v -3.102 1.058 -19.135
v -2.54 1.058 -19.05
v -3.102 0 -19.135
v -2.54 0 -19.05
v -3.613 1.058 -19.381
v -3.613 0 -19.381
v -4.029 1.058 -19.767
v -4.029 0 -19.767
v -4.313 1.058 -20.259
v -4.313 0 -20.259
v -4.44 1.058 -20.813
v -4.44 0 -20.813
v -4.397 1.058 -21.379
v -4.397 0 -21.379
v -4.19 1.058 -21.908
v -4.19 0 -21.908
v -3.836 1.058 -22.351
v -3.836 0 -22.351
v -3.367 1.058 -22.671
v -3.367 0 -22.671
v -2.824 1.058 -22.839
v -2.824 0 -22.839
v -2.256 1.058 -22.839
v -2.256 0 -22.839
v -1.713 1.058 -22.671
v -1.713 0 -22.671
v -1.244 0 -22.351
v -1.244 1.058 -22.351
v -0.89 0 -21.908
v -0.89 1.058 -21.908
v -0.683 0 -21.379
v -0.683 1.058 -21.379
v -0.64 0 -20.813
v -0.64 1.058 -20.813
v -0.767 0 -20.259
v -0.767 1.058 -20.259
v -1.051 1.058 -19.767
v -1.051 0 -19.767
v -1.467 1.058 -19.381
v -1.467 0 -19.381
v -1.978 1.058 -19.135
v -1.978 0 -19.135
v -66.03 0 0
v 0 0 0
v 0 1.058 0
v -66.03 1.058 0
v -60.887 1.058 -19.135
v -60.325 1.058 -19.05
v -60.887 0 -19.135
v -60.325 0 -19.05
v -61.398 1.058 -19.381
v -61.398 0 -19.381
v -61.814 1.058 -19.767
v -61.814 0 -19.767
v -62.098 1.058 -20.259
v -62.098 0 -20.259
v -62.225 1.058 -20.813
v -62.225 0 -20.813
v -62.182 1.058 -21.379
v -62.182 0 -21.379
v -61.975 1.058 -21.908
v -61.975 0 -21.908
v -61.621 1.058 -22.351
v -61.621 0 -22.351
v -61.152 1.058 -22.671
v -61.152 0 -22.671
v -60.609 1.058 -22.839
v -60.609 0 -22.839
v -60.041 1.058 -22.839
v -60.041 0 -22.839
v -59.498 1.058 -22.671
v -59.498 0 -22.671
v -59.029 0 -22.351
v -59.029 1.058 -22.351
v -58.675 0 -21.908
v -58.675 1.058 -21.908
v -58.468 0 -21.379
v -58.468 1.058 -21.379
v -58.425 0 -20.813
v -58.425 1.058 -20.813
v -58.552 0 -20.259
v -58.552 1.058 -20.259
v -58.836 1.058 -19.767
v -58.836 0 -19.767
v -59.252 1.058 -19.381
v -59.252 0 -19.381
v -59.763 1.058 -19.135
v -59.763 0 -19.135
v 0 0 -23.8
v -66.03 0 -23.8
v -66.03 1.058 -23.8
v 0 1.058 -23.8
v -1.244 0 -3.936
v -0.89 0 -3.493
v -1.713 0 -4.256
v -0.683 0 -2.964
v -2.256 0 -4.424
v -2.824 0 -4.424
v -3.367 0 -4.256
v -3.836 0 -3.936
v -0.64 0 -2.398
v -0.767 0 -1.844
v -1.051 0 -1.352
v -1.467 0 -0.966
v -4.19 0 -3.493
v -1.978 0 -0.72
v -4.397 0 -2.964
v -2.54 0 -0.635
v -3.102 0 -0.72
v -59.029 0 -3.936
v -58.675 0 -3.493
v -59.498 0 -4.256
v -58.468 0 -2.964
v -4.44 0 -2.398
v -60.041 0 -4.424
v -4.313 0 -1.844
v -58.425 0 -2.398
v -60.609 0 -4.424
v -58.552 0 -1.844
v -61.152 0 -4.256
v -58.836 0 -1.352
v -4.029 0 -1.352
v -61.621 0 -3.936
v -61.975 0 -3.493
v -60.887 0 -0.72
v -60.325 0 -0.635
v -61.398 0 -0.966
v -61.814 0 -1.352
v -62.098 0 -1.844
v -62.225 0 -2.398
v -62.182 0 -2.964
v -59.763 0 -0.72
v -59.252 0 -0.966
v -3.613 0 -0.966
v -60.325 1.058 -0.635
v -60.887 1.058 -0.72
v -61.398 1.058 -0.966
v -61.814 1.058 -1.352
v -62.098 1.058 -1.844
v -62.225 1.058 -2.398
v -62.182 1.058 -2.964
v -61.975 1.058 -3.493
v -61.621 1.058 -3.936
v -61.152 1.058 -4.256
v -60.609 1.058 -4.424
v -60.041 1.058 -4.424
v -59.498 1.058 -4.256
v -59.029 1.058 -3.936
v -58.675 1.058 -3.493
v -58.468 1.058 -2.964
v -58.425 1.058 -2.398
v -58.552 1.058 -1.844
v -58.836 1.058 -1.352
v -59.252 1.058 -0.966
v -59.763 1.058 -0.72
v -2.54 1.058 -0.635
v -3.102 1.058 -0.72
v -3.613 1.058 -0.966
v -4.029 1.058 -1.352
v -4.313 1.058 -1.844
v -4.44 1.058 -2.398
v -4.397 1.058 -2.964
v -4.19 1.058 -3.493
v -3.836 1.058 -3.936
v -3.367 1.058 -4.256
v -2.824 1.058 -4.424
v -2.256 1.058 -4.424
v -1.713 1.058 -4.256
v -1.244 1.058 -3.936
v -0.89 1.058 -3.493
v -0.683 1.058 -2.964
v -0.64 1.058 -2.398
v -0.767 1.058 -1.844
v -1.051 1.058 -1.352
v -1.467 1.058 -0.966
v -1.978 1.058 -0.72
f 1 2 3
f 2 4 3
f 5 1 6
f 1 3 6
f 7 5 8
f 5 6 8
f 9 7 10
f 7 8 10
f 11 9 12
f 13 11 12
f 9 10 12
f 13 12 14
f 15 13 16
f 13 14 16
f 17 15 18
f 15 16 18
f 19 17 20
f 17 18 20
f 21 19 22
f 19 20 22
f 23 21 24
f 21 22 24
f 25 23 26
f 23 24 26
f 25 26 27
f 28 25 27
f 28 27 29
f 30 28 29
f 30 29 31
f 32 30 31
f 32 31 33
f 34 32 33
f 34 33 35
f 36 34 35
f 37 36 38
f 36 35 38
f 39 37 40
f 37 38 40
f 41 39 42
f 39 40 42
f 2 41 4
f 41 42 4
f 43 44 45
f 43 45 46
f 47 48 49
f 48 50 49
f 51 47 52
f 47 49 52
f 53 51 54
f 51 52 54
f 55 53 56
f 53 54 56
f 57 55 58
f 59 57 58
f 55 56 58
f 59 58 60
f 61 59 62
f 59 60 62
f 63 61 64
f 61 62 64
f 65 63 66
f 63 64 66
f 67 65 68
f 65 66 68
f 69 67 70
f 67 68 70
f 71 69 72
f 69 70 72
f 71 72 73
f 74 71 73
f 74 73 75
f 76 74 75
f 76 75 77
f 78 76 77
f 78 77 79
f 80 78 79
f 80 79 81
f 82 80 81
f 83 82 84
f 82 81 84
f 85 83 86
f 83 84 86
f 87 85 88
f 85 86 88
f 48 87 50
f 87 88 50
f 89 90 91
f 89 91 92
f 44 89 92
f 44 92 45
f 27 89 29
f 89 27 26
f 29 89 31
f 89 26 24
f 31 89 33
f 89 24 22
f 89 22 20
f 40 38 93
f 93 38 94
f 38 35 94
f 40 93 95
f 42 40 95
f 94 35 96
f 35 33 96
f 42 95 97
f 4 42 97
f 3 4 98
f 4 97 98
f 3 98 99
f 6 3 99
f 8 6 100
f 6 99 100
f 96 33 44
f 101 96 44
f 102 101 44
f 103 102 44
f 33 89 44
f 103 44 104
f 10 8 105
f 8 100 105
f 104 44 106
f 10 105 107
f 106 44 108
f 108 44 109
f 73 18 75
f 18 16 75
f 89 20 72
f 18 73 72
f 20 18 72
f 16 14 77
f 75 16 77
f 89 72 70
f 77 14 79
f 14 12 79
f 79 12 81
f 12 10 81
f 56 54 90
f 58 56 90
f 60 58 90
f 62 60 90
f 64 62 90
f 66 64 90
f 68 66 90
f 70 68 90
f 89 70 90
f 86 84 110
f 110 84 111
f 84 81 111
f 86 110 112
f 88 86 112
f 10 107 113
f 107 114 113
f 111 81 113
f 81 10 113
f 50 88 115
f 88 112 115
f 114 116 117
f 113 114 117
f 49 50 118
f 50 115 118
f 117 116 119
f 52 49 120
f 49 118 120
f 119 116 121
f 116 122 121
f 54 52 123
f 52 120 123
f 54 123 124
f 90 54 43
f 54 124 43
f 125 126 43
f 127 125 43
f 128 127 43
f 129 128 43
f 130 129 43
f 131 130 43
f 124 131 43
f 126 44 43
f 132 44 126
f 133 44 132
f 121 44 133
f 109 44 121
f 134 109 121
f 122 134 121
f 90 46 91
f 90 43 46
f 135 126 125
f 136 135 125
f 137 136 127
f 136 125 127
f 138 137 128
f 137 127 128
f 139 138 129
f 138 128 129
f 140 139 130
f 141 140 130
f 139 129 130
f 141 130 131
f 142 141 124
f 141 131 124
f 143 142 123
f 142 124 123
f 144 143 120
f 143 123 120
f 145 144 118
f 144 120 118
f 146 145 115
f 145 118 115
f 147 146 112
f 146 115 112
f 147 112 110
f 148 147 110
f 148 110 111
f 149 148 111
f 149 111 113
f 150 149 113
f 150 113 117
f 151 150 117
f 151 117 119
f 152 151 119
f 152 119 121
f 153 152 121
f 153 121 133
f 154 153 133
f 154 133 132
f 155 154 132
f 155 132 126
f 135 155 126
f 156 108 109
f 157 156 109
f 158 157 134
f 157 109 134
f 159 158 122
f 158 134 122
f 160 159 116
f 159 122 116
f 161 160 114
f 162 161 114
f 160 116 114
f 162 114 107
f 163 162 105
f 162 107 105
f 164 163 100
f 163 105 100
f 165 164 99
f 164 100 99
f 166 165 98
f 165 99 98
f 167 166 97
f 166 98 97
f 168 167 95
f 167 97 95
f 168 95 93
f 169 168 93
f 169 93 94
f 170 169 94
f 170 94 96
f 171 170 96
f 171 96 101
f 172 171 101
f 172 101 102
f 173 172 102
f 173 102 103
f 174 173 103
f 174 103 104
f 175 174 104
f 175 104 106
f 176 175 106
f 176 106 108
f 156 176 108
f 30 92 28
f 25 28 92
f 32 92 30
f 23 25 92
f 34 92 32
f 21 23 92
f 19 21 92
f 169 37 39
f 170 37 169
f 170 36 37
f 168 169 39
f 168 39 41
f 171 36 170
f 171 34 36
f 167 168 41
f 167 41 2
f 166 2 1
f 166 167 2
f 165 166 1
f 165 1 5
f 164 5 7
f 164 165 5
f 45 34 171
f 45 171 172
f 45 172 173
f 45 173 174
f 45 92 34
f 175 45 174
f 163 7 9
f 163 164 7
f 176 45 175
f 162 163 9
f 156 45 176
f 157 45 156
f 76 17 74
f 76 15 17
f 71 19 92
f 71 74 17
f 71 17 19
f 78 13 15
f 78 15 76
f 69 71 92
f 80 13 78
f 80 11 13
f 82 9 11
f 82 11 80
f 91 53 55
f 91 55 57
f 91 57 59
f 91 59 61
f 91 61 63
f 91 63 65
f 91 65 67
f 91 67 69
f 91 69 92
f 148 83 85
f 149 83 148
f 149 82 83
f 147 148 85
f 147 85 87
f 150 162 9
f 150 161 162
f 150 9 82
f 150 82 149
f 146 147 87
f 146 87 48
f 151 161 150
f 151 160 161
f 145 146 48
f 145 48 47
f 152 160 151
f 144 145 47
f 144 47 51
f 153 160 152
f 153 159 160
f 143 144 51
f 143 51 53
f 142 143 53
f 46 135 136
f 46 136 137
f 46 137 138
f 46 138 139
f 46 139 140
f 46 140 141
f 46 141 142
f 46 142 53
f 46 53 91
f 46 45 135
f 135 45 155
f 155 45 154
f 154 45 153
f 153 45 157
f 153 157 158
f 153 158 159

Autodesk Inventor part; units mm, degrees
ref_plane "YZ Plane" through (0, 0, 0) normal (1, 0, 0) x (0, 1, 0)
ref_plane "XZ Plane" through (0, 0, 0) normal (0, 1, 0) x (-1, 0, 0)
ref_plane "XY Plane" through (0, 0, 0) normal (0, 0, 1) x (1, 0, 0)
sketch "Sketch1" plane through (0, 0, 0) normal (0, 1, 0) x (-1, 0, 0)
  line L0 (0, 0) -> (66.03, 0)
  line L1 (66.03, 0) -> (66.03, -23.8)
  line L2 (66.03, -23.8) -> (0, -23.8)
  line L3 (0, -23.8) -> (0, 0)
  dimension "d0" = 66.03
  dimension "d1" = 23.8
extrude "Extrusion1" add sketch "Sketch1" along normal blind 1.0583
sketch "Sketch2" plane through (0, 1.0583, 0) normal (0, 1, 0) x (1, 0, 0)
  line L0 (0, 0) -> (0, 23.8) projected
  line L1 (-66.03, 0) -> (0, 0) projected
  point P0 (-60.325, 2.54)
  point P1 (-2.54, 2.54)
  point P2 (-2.54, 20.955)
  point P3 (-60.325, 20.955)
  dimension "d4" = 60.325
  dimension "d5" = 60.325
  dimension "d6" = 2.54
  dimension "d7" = 2.54
  dimension "d8" = 2.54
  dimension "d9" = 2.54
  dimension "d10" = 20.955
  dimension "d11" = 20.955
hole "Hole1" at (-60.325, 1.0583, -2.54) at (-2.54, 1.0583, -2.54) at (-2.54, 1.0583, -20.955) at (-60.325, 1.0583, -20.955) direction (0, -1, 0) diameter 3.81 end through all
equation "\"d5\" = d4"
equation "\"d7\" = d6"
equation "\"d8\" = d7"
equation "\"d9\" = d8"
equation "\"d11\" = d10"
properties part number "PCB"
